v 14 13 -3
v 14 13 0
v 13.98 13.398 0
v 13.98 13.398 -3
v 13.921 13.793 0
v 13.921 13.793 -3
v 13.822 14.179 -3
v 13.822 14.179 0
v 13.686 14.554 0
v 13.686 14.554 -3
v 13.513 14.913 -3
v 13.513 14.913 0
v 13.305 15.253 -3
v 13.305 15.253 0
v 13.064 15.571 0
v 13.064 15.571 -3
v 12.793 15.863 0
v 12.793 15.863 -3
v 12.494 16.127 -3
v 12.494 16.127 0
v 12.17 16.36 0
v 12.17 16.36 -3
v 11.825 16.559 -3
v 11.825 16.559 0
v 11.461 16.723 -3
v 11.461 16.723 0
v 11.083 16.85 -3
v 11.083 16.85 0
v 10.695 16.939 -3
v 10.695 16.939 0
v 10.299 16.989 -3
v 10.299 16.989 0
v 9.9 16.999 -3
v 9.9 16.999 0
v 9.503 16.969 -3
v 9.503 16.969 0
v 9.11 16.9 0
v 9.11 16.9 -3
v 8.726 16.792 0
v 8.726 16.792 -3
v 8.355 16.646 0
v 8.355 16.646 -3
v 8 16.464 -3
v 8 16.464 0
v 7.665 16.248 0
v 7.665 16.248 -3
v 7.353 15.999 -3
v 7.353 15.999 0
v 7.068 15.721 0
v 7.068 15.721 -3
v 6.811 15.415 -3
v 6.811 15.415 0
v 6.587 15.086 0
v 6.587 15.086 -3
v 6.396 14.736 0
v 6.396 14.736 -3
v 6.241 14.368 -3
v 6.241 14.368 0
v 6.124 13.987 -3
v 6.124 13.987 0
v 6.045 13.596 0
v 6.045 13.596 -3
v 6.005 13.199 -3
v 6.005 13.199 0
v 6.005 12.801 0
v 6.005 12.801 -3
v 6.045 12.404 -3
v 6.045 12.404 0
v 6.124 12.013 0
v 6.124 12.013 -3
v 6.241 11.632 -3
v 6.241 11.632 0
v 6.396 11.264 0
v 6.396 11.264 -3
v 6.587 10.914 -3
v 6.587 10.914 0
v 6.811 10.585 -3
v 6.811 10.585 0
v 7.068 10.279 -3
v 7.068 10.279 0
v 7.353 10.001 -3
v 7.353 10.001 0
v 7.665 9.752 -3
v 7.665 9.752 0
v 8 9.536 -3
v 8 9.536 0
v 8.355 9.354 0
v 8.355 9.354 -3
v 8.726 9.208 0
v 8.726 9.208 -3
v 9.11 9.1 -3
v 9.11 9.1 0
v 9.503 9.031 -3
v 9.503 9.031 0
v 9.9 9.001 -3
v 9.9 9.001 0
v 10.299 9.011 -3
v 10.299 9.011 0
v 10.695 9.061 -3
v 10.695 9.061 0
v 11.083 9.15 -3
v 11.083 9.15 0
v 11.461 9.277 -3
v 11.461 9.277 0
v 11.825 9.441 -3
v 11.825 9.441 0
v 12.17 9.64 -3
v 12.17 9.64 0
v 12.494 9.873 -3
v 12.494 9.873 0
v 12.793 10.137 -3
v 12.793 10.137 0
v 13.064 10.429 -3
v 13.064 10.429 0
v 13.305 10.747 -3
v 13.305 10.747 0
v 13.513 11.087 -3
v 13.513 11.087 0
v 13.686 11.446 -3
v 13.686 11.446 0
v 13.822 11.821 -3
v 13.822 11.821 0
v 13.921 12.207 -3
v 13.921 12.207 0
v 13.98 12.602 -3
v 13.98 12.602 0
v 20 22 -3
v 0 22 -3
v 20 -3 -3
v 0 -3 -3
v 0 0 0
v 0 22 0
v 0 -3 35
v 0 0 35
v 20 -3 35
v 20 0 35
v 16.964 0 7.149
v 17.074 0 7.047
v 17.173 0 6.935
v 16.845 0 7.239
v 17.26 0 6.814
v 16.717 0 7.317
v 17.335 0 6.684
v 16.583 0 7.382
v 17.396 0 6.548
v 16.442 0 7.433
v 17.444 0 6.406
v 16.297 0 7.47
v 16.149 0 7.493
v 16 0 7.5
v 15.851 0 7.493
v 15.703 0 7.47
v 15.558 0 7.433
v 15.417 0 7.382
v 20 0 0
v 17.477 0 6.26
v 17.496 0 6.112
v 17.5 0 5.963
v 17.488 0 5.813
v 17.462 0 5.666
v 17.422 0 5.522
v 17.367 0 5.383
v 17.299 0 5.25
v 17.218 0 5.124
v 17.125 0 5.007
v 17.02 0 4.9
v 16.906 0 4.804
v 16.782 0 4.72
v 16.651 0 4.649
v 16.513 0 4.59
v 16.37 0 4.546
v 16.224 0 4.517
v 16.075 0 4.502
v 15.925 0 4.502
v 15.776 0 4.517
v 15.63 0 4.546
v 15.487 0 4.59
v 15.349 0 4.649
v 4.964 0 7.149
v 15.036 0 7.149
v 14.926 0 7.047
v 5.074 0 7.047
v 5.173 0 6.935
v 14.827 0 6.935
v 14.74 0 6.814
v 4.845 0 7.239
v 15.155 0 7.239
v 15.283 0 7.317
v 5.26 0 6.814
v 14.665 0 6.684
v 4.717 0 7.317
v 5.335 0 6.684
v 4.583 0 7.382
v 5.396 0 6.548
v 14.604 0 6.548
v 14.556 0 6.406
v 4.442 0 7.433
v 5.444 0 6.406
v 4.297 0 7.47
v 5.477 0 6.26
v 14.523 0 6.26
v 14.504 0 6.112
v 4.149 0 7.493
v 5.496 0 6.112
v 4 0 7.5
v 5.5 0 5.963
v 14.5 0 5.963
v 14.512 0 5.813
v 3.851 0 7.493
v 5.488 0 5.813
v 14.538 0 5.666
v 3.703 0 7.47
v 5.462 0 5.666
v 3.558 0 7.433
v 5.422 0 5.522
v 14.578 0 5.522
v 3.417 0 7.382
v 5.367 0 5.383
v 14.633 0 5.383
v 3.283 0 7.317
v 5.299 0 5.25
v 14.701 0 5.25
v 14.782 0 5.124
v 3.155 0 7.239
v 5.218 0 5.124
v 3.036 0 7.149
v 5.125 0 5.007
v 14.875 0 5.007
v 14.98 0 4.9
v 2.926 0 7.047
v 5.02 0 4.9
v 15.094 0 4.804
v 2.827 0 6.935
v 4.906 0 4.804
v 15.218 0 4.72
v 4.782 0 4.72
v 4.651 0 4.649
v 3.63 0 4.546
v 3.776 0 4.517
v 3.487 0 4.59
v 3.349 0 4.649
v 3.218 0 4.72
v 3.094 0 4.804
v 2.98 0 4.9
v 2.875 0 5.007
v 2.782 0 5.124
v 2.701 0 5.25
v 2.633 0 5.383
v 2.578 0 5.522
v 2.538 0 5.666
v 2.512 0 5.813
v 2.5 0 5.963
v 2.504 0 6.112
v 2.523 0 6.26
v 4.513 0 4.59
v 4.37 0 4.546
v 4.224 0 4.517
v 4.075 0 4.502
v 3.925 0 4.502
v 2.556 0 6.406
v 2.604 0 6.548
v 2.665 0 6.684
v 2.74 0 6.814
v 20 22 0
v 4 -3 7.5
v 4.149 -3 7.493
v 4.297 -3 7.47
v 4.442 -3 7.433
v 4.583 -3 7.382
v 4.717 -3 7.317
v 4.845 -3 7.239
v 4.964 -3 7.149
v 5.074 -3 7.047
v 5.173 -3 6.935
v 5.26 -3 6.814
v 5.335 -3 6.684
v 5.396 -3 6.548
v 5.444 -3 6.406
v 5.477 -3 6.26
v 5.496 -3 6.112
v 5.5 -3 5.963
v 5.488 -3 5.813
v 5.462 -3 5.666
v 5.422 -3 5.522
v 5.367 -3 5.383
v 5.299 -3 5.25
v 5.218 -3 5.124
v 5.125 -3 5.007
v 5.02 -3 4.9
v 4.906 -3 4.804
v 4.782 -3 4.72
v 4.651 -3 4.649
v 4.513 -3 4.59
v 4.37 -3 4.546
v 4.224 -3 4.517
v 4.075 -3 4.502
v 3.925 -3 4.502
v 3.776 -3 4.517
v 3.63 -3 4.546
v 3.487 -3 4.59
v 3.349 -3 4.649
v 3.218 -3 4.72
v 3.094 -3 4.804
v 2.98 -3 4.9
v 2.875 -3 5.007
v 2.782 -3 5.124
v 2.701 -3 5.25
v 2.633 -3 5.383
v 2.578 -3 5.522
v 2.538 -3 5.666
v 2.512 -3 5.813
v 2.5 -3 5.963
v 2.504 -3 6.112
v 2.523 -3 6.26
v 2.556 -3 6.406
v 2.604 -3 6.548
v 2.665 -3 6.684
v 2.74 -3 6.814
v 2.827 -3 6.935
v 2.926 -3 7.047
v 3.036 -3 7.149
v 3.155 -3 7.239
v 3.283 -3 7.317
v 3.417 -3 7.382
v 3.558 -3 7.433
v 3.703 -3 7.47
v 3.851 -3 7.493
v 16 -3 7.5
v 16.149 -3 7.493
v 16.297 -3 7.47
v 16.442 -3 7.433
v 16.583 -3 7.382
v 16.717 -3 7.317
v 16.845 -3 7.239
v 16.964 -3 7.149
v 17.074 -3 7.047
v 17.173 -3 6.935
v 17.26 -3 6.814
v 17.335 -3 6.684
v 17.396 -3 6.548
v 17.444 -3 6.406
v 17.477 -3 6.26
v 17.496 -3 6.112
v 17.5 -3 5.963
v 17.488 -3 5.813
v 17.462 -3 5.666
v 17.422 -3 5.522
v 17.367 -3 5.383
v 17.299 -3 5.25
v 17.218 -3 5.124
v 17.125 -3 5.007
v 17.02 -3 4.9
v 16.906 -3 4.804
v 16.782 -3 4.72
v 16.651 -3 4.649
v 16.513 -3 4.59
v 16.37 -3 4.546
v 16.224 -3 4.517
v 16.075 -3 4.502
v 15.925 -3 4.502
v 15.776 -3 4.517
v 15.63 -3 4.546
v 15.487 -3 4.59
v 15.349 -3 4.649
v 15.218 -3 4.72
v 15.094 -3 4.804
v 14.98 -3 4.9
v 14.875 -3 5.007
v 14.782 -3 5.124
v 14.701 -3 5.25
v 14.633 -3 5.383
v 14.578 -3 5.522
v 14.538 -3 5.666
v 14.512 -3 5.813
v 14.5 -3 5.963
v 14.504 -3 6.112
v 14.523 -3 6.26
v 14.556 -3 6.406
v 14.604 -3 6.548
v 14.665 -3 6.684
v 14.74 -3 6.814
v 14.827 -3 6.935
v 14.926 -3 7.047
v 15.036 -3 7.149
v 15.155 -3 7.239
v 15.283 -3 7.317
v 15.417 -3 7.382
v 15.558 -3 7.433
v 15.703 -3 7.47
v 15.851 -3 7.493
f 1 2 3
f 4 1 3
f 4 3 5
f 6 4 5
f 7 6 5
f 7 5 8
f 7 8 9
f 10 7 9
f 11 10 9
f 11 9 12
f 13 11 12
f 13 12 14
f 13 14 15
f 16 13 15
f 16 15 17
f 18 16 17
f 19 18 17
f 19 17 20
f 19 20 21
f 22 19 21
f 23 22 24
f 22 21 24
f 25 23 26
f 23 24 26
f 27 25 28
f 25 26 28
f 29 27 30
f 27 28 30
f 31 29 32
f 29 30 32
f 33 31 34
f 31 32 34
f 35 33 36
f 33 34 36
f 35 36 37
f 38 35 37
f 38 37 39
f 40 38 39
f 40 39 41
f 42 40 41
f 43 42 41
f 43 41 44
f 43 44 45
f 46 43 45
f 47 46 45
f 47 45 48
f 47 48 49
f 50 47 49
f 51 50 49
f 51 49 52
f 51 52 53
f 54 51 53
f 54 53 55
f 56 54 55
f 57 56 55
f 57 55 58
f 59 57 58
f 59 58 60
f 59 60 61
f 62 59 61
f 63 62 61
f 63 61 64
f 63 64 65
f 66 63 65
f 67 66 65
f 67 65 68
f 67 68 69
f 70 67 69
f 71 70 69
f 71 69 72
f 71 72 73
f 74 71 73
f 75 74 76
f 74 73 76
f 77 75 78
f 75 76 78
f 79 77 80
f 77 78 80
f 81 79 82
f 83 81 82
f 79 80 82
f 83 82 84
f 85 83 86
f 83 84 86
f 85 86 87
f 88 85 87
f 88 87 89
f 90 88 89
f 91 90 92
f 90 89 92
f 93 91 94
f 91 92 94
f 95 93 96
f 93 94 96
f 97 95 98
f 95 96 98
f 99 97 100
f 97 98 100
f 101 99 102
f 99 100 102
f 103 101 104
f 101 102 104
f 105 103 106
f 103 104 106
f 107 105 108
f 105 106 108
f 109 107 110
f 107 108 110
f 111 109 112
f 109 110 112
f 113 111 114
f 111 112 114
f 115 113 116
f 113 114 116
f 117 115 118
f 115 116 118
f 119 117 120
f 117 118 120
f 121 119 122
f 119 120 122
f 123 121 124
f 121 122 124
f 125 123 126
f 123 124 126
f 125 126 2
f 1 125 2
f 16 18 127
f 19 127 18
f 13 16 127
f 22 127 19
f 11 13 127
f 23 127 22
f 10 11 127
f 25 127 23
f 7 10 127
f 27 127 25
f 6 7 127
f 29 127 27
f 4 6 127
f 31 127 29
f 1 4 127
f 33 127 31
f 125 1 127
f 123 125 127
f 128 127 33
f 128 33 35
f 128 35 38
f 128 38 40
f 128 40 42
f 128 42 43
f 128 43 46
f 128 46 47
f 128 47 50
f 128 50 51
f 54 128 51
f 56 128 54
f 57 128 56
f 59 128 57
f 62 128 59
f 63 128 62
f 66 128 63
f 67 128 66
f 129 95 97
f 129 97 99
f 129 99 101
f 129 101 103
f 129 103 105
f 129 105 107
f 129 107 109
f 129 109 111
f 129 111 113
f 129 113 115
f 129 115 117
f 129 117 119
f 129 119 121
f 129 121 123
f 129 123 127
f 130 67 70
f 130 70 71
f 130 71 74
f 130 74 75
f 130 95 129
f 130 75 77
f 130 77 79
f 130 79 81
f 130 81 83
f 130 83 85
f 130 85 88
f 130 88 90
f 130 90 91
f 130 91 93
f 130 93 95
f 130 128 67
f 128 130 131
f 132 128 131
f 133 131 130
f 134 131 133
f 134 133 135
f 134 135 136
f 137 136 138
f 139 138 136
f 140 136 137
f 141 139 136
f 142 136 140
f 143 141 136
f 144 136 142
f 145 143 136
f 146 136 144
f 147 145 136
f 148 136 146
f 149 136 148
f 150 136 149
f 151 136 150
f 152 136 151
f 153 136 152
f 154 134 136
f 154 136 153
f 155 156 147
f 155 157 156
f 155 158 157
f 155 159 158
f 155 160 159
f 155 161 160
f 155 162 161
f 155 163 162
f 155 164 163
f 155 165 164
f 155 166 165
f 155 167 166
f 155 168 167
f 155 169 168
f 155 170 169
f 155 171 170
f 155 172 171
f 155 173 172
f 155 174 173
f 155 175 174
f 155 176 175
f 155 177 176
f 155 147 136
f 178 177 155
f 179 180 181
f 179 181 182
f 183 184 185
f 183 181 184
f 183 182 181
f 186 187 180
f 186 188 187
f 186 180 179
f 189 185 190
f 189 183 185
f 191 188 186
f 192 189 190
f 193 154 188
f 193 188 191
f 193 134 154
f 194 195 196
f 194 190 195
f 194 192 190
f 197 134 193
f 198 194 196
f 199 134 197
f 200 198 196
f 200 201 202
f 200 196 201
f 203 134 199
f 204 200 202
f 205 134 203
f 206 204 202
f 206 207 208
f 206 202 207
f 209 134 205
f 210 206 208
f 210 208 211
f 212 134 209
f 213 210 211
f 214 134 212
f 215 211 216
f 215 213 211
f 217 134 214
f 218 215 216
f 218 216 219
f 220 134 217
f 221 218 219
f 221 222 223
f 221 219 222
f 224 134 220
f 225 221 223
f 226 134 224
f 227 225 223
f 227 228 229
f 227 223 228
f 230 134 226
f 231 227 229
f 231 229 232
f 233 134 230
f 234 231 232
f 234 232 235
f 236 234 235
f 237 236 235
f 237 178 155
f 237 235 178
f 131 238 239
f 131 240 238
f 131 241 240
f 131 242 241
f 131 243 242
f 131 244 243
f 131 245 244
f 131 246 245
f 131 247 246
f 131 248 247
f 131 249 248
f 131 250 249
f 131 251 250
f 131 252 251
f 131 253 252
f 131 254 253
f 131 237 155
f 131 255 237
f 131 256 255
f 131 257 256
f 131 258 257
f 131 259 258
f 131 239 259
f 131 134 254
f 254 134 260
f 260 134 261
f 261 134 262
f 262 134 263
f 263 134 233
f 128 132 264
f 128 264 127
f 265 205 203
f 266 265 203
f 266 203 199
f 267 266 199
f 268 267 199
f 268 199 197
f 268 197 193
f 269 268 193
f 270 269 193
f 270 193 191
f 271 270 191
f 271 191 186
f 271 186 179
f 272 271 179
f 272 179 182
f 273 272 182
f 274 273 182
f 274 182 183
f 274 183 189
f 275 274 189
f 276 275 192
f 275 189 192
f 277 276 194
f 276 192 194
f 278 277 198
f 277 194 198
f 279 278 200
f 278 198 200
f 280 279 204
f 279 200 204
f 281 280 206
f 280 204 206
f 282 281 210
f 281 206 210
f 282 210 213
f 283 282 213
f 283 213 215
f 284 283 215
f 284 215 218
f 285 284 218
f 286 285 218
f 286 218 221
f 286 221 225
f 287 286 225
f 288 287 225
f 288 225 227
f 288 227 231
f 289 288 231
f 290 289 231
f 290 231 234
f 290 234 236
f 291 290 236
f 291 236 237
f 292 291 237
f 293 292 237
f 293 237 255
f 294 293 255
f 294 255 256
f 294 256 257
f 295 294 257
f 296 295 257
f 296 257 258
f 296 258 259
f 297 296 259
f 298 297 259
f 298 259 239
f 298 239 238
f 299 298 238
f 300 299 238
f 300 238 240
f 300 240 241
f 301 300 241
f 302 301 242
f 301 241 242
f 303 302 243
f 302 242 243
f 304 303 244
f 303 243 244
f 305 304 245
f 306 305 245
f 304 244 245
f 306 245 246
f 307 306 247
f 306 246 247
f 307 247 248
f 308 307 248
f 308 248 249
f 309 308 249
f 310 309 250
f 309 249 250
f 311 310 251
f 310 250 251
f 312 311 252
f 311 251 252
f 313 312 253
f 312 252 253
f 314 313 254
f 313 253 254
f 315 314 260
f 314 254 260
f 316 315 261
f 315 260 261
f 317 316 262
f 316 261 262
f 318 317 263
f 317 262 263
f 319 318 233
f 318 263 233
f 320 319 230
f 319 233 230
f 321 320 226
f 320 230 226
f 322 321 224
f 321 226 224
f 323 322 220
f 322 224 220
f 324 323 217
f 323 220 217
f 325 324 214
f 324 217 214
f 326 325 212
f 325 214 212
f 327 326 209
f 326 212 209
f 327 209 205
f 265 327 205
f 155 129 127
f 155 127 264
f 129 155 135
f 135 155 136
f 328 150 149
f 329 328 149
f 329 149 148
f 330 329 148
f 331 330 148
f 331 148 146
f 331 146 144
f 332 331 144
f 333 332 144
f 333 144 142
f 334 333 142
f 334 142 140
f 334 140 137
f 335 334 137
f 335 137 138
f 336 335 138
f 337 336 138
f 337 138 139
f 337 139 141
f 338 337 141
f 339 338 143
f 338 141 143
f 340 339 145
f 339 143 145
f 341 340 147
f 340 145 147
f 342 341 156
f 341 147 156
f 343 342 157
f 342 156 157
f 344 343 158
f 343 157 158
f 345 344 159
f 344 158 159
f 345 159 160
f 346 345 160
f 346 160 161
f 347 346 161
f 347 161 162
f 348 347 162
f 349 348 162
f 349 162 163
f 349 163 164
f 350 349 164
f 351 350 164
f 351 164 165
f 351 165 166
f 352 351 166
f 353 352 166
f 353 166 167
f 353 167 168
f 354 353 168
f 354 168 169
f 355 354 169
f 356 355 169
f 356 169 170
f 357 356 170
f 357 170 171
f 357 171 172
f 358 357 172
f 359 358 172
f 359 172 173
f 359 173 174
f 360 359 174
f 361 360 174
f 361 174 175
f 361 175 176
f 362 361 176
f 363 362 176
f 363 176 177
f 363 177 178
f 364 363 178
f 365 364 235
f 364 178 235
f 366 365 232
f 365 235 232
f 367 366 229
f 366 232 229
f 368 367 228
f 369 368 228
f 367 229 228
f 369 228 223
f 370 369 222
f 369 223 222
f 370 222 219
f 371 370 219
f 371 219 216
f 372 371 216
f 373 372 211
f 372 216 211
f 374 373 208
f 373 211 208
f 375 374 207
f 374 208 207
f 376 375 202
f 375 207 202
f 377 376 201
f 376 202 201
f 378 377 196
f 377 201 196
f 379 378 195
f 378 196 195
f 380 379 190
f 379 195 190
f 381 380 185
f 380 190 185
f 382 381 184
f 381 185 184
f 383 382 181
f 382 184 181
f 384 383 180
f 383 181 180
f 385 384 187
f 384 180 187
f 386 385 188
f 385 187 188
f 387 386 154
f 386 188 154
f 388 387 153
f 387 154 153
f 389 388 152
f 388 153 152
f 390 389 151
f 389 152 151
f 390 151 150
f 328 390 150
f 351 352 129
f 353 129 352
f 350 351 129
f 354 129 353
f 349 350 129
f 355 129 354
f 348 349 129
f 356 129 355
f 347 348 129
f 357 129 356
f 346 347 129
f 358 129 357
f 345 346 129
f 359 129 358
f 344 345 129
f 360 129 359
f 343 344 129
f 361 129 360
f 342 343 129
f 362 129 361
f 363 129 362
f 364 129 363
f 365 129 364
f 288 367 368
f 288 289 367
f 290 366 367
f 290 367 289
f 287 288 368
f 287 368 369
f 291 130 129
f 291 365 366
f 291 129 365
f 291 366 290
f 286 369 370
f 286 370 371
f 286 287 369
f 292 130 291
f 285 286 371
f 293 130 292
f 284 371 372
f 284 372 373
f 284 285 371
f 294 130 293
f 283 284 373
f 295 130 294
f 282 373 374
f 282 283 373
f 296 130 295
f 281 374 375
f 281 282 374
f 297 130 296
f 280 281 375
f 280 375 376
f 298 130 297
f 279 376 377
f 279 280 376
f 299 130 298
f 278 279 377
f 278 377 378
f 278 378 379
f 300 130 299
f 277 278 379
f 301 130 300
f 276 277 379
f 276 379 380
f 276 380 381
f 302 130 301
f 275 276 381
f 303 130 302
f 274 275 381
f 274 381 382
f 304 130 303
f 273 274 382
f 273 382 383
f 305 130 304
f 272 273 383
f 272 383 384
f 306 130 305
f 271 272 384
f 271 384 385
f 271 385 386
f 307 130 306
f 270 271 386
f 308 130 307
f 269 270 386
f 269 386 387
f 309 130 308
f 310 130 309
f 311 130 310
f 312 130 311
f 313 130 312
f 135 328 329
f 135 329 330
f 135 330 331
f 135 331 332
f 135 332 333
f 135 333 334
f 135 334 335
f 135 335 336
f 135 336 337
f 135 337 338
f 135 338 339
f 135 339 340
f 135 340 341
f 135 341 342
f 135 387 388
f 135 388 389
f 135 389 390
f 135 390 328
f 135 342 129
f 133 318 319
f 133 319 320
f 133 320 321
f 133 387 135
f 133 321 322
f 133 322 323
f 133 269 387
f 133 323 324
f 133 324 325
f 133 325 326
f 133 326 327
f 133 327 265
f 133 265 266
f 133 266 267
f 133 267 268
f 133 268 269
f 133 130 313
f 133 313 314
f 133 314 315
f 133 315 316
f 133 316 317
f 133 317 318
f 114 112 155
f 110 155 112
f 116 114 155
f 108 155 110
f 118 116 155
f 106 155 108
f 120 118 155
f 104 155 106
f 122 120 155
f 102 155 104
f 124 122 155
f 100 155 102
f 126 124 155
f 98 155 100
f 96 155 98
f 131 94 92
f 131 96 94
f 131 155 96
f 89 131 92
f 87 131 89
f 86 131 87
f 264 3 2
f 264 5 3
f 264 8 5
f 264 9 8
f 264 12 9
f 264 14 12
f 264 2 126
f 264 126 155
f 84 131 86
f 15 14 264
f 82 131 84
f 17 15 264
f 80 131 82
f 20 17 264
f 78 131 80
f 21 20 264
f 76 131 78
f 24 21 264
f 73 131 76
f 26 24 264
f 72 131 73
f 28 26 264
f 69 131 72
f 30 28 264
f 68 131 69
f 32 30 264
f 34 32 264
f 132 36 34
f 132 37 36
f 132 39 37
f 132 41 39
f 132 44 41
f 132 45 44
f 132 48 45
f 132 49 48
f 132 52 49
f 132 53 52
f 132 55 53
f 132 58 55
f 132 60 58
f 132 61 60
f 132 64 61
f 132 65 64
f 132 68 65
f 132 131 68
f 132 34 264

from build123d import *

# Parameters (mm, degrees)
EXTRUDE_1_DEPTH     = 20
CUT_EXTRUDE_1_REACH = 47.924
SKETCH_2_R          = 4
CUT_EXTRUDE_2_REACH = 47.924
SKETCH_3_R          = 1.5


with BuildPart() as part:
    # 草图1 → 凸台-拉伸1 (new body)
    with BuildSketch(Plane(origin=(0, 0, 0), x_dir=(0, 0, -1), z_dir=(1, 0, 0))):
        Polygon((0, 0), (0, 22), (3, 22), (3, -3), (-35, -3), (-35, 0), align=None)
    extrude(amount=EXTRUDE_1_DEPTH)

    # 草图2 → 切除-拉伸1 (cut, up to next)
    with BuildSketch(Plane.XY, mode=Mode.PRIVATE) as cut_extrude_1_sk1:
        with Locations((10, 13)):
            Circle(SKETCH_2_R)
    cut_extrude_1_tool1 = extrude(cut_extrude_1_sk1.sketch, amount=-CUT_EXTRUDE_1_REACH, mode=Mode.PRIVATE) & part.part
    add(cut_extrude_1_tool1.solids().sort_by_distance((10, 13, 0))[0], mode=Mode.SUBTRACT)

    # 草图3 → 切除-拉伸2 (cut, up to next)
    with BuildSketch(Plane(origin=(0, 0, 0), x_dir=(1, 0, 0), z_dir=(0, 1, 0)), mode=Mode.PRIVATE) as cut_extrude_2_sk1:
        with Locations(Location((4, -6, 0), (0, 0, 270))):
            Circle(SKETCH_3_R)
    cut_extrude_2_tool1 = extrude(cut_extrude_2_sk1.sketch, amount=-CUT_EXTRUDE_2_REACH, mode=Mode.PRIVATE) & part.part
    # 草图3 → 切除-拉伸2 (cut, up to next)
    with BuildSketch(Plane(origin=(0, 0, 0), x_dir=(1, 0, 0), z_dir=(0, 1, 0)), mode=Mode.PRIVATE) as cut_extrude_2_sk2:
        with Locations(Location((16, -6, 0), (0, 0, 270))):
            Circle(SKETCH_3_R)
    cut_extrude_2_tool2 = extrude(cut_extrude_2_sk2.sketch, amount=-CUT_EXTRUDE_2_REACH, mode=Mode.PRIVATE) & part.part
    add(cut_extrude_2_tool1.solids().sort_by_distance((4, 0, 6))[0], mode=Mode.SUBTRACT)
    add(cut_extrude_2_tool2.solids().sort_by_distance((16, 0, 6))[0], mode=Mode.SUBTRACT)


solid = part.part
